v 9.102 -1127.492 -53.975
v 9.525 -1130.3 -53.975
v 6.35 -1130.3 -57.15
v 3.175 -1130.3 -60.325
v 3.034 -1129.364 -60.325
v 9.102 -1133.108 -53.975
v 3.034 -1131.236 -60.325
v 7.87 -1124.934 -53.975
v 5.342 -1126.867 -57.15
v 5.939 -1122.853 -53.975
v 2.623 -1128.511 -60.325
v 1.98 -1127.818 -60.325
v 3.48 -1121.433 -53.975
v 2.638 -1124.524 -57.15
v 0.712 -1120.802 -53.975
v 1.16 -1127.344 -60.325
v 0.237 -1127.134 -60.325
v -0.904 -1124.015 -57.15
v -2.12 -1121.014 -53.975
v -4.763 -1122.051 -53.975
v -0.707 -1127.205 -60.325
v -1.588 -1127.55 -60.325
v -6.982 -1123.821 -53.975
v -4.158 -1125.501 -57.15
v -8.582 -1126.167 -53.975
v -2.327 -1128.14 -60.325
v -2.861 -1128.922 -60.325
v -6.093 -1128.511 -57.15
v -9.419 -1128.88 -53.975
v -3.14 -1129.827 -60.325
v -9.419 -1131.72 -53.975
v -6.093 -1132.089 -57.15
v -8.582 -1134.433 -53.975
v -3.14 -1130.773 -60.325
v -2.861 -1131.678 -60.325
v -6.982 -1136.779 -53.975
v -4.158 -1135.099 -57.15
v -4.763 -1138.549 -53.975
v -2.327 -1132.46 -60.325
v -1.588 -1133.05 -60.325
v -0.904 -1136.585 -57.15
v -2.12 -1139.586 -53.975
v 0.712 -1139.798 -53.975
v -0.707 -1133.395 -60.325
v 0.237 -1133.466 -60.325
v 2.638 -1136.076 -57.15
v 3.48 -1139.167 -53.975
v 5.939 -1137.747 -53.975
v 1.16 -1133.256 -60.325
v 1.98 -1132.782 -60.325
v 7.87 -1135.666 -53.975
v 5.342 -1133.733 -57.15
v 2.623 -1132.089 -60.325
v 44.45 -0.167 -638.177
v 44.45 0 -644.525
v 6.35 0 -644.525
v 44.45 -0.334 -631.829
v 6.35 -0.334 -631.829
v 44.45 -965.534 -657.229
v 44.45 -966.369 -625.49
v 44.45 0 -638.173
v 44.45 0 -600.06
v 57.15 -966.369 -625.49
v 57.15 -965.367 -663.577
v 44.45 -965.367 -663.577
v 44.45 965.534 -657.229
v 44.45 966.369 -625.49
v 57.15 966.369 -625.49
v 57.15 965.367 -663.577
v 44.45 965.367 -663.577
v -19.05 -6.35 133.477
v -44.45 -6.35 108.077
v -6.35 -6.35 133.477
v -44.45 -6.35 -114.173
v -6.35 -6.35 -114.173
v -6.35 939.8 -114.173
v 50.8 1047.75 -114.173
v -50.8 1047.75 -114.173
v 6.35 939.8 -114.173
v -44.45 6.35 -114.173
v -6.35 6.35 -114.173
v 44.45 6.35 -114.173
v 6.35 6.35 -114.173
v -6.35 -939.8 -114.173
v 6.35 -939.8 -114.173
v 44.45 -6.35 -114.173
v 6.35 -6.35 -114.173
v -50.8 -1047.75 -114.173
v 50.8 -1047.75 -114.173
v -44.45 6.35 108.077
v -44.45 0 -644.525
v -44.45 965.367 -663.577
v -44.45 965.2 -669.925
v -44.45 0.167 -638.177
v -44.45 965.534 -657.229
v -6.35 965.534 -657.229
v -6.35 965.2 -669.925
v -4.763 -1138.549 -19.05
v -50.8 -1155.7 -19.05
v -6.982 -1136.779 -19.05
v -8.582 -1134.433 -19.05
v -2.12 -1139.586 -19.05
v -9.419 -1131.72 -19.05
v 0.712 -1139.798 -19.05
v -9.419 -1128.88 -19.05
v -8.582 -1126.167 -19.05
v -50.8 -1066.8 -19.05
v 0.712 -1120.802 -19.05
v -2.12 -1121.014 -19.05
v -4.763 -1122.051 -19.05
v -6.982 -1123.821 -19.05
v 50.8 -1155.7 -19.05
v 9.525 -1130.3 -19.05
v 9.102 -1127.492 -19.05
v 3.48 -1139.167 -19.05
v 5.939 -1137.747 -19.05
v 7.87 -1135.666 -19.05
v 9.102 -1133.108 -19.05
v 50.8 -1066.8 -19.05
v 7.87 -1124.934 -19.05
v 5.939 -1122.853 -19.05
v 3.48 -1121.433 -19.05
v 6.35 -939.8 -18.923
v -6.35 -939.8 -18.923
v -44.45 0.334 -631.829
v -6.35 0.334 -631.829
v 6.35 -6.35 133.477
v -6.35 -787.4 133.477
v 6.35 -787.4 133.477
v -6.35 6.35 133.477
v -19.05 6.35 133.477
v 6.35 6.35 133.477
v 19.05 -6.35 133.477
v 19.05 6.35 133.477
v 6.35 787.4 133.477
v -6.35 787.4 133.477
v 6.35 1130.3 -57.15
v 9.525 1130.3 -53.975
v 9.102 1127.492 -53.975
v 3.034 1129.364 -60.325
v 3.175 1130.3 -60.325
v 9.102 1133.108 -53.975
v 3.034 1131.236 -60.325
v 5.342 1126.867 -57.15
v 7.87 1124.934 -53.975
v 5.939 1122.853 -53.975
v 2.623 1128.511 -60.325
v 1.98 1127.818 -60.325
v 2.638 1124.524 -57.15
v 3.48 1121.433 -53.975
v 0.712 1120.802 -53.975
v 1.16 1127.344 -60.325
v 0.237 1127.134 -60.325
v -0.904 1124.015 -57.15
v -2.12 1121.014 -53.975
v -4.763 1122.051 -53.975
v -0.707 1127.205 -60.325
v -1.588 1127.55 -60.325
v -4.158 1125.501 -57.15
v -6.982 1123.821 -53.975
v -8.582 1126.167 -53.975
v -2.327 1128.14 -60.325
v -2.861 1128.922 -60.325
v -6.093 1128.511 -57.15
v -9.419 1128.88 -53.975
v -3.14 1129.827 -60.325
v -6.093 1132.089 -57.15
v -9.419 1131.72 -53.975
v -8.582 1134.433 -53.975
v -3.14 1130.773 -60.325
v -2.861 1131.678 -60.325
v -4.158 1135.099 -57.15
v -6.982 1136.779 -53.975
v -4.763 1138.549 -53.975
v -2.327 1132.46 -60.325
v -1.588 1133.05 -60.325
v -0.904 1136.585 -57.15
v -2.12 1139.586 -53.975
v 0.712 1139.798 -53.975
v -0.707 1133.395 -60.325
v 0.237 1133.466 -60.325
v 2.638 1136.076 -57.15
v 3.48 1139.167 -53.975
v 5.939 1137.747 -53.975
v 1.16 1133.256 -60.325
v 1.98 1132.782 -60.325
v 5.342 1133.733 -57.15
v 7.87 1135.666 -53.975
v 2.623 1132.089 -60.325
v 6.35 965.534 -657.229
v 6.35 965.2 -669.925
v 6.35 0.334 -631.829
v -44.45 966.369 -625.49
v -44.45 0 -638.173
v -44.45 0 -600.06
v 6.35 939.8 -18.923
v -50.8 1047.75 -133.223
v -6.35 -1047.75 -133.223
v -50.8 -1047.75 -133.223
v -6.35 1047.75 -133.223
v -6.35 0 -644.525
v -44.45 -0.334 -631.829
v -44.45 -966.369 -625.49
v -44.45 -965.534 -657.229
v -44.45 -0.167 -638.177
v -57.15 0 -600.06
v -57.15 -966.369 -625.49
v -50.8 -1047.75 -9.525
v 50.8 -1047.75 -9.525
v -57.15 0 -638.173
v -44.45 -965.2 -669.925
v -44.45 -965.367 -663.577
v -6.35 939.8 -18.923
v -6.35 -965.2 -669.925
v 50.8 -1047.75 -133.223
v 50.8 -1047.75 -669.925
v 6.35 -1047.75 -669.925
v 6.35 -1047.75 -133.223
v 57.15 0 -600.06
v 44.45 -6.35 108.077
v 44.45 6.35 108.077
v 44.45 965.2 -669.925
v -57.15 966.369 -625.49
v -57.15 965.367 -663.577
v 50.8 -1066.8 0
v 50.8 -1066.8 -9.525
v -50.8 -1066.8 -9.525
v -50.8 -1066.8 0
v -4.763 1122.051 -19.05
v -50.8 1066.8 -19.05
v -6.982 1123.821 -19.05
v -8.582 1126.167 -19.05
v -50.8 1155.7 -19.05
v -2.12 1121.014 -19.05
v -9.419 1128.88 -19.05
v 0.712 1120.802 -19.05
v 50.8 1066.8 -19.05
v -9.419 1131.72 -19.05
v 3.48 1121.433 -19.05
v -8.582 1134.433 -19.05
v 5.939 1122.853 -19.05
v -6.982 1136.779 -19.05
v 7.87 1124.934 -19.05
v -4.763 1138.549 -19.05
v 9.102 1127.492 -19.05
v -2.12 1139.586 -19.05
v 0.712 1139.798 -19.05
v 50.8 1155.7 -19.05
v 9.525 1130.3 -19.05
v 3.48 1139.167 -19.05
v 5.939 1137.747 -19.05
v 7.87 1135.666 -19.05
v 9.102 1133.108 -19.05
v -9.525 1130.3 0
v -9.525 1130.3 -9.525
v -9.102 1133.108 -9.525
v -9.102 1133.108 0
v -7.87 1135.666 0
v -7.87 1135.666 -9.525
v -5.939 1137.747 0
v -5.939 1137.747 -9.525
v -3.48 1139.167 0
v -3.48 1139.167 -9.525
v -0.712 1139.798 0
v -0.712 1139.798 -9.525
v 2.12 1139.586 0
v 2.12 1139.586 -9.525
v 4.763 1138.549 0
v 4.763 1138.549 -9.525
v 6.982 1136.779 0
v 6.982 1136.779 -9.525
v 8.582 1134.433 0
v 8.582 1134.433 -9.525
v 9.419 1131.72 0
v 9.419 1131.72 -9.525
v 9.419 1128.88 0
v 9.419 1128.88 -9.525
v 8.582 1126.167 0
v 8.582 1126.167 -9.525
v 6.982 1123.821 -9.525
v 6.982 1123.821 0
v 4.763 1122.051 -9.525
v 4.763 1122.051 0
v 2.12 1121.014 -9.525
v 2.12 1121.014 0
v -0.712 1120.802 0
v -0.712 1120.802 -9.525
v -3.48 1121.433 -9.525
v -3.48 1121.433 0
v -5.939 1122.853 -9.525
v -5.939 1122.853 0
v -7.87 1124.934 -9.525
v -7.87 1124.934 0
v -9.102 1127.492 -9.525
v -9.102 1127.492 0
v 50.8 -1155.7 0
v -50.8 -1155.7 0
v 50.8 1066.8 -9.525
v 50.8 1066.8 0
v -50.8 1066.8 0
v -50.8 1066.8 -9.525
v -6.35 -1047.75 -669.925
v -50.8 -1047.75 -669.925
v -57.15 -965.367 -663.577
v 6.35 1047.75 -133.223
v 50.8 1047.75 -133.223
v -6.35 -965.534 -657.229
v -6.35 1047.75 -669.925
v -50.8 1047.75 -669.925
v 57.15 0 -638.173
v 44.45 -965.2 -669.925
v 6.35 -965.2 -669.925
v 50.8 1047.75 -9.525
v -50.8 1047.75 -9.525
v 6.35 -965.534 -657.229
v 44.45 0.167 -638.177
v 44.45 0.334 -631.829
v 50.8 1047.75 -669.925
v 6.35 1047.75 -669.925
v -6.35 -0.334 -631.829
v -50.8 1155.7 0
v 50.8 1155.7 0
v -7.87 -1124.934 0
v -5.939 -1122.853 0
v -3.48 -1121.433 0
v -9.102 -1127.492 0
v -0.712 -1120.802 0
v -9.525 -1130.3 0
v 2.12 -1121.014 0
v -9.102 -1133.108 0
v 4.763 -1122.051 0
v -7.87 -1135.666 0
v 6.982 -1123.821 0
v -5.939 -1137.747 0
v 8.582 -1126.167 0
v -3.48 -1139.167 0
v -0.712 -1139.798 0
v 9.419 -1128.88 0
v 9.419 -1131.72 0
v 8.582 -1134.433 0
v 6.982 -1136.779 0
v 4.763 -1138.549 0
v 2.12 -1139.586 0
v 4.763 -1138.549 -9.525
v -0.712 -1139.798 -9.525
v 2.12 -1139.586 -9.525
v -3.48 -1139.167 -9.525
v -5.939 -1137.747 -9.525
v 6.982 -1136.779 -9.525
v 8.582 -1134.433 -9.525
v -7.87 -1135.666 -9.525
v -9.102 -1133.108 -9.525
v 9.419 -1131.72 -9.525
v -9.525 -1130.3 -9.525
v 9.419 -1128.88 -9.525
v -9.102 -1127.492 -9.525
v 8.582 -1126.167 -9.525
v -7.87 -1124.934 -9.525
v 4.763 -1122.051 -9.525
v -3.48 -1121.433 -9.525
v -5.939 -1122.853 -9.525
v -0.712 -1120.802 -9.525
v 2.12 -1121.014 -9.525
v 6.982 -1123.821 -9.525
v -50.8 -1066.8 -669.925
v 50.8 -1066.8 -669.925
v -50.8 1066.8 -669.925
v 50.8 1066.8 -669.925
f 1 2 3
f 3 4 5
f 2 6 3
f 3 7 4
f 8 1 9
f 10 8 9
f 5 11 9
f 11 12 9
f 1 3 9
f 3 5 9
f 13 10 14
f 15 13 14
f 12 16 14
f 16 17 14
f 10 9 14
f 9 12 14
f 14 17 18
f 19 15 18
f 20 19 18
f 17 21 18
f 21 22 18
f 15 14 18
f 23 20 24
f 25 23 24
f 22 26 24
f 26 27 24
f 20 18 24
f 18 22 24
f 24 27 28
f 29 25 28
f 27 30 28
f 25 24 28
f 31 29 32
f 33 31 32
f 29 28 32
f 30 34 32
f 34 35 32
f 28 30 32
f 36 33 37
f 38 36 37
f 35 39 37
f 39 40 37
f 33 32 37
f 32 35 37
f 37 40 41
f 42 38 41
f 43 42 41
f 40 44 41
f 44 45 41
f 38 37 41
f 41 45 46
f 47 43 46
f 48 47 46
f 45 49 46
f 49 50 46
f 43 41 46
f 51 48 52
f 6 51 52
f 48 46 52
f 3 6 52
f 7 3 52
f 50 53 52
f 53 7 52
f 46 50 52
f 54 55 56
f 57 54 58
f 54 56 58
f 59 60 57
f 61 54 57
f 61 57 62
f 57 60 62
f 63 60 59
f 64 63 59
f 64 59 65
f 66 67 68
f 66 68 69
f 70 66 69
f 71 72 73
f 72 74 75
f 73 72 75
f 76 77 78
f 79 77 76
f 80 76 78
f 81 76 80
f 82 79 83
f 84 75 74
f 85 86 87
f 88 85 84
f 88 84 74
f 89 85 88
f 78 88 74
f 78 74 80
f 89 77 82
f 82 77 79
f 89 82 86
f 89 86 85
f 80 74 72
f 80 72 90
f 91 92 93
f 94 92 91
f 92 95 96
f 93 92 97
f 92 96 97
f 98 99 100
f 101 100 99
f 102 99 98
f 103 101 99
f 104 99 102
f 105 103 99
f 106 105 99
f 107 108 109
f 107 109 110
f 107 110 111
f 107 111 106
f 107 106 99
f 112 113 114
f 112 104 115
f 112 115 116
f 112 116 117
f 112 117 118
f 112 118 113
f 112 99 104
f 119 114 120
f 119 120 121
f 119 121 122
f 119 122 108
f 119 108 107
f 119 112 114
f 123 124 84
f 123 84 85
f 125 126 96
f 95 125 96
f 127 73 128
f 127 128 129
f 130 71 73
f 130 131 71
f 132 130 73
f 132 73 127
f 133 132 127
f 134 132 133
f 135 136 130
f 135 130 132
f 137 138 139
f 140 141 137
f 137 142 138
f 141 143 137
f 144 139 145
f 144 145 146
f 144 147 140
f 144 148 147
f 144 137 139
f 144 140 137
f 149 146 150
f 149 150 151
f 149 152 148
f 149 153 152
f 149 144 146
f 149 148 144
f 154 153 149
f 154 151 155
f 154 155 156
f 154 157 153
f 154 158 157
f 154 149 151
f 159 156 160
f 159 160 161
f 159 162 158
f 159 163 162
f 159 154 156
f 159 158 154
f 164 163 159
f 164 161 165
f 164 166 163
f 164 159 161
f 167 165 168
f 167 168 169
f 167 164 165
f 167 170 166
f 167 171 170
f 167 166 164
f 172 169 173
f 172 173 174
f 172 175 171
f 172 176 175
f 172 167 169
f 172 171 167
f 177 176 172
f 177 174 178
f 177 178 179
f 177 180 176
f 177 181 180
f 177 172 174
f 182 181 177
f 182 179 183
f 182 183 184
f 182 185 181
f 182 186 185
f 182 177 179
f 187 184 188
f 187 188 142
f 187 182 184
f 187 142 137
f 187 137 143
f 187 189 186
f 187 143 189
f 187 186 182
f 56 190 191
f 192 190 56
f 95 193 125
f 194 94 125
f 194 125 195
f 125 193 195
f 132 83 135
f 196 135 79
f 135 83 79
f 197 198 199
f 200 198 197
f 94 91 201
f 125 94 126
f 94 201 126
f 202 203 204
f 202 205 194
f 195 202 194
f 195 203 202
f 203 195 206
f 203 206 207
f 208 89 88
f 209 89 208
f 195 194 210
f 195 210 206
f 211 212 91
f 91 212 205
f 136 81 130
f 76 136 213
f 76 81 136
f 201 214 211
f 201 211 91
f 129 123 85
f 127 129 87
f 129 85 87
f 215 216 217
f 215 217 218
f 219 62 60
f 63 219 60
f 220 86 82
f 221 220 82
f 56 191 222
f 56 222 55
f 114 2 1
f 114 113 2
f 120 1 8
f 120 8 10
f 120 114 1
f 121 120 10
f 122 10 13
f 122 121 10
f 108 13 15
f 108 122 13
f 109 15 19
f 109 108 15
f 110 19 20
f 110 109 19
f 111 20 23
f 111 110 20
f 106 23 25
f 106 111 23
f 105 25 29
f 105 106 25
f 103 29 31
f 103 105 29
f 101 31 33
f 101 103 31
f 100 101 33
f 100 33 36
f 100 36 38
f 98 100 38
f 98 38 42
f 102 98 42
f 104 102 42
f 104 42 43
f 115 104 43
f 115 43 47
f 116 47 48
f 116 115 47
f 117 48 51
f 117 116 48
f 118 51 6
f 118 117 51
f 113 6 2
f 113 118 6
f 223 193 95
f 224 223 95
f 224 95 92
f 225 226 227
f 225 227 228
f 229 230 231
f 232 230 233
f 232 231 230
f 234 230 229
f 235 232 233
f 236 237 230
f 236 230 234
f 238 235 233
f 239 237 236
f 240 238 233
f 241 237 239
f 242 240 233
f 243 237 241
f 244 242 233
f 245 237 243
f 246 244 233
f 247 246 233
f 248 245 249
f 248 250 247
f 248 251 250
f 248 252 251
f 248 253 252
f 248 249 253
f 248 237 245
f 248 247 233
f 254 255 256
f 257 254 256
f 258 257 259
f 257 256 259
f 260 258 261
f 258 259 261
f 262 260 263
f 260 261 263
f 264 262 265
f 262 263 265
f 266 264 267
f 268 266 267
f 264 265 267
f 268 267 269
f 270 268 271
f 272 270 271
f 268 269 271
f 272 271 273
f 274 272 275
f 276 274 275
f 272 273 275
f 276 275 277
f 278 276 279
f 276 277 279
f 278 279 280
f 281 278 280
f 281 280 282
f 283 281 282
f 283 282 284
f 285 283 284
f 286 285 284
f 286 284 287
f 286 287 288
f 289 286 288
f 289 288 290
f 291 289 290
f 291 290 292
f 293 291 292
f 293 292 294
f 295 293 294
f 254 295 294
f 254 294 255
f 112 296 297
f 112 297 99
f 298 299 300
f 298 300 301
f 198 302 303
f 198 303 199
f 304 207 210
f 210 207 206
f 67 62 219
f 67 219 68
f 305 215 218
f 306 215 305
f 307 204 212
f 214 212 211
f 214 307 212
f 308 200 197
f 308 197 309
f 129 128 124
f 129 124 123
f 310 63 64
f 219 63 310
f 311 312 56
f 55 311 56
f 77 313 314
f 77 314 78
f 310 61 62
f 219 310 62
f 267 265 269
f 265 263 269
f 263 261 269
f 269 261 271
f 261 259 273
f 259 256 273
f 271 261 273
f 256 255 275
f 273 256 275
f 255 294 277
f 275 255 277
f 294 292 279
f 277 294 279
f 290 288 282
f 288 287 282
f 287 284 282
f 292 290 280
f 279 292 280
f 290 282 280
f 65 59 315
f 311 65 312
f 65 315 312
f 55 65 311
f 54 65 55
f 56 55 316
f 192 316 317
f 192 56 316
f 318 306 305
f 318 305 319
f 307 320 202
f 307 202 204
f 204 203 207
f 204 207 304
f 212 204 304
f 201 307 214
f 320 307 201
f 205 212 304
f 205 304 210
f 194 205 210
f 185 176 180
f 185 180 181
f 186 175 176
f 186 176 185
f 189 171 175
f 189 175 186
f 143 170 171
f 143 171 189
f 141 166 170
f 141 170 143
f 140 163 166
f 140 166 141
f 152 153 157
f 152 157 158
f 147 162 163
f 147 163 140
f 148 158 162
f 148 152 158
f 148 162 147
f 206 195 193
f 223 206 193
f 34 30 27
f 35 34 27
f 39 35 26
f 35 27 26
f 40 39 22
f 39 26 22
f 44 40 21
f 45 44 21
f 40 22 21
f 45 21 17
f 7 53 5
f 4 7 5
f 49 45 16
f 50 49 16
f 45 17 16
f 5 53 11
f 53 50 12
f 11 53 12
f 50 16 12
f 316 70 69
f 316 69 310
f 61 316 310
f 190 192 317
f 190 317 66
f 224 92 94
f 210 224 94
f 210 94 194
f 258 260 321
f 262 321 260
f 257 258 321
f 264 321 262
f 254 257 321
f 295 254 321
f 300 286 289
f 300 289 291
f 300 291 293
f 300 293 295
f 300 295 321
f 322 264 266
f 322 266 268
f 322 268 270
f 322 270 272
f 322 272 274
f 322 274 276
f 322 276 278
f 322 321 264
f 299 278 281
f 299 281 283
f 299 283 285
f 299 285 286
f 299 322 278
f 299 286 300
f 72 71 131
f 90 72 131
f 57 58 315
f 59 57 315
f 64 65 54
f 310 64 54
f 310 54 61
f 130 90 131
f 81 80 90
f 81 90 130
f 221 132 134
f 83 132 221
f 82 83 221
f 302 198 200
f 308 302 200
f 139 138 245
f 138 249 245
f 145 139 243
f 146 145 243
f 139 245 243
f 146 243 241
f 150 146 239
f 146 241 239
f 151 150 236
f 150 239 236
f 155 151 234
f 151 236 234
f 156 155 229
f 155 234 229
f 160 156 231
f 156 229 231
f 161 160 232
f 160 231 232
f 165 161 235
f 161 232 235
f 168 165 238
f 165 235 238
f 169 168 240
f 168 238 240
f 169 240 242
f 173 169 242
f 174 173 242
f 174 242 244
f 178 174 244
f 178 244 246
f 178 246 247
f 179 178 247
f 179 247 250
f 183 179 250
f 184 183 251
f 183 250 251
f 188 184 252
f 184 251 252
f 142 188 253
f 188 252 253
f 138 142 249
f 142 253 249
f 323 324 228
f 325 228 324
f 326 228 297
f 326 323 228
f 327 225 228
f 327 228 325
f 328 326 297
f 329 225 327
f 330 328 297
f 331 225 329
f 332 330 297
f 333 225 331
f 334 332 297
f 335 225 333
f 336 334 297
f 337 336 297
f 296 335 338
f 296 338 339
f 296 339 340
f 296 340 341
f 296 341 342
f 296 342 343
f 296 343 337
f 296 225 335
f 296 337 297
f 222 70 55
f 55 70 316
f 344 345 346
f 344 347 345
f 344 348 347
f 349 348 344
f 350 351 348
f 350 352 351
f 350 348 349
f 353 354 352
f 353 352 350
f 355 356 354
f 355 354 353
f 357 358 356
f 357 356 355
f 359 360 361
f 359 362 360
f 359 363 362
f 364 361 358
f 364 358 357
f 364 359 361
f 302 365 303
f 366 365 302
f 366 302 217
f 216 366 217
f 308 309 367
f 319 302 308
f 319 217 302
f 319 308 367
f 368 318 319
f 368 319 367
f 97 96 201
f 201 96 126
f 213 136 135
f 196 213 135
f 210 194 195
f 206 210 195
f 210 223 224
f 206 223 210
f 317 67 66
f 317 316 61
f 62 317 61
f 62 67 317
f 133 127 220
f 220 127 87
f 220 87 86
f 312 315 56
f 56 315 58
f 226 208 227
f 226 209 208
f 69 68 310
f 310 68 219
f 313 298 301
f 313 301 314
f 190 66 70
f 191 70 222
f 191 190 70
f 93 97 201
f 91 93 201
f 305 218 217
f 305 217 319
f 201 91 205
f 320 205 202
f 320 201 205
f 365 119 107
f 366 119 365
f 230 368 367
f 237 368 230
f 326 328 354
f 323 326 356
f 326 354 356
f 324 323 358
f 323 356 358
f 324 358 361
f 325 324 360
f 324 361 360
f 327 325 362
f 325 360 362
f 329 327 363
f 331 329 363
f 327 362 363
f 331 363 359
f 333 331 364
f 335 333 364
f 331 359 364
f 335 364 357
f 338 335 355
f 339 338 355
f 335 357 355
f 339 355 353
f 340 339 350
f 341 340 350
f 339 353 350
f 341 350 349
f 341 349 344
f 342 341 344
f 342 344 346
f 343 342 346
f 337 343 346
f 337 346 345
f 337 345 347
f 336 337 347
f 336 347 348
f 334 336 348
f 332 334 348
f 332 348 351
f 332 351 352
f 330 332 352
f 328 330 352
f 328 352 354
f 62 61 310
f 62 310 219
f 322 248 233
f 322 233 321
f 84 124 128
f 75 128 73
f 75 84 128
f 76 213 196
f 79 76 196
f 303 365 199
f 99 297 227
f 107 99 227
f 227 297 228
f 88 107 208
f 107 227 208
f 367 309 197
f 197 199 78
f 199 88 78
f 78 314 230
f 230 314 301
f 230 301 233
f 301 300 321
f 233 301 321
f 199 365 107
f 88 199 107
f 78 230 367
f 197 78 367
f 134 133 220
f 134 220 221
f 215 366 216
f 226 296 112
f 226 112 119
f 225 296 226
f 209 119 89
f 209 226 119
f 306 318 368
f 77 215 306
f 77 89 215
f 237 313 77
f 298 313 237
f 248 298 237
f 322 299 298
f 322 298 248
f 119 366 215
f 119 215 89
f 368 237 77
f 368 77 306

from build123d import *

# Parameters (mm, degrees)
F0_W      = 1047.75
F0_H      = 19.05
F1_DEPTH  = 50.8
F2_W      = 2095.5
F2_H      = 536.702
F3_DEPTH  = 6.35
F4_W      = 12.7
F4_H      = 1879.6
F5_DEPTH  = 247.65
F6_SIZE   = 152.4
F7_W      = 88.9
F7_H      = 12.7
F8_DEPTH  = 247.65
F9_SIZE   = 25.4
F11_D     = 19.05
F13_R     = 9.525
F14_DEPTH = 50.8
F15_SIZE  = 6.35
F18_DEPTH = 38.1
F20_DEPTH = 12.7


with BuildPart() as f1:
    # F0 (on Right) → F1 (new body, symmetric)
    with BuildSketch(Plane.YZ):
        Polygon((-1047.75, -9.525), (-1066.8, -9.525), (-1066.8, -19.05), (-1066.8, -669.925), (-1047.75, -669.925), (-1047.75, -133.223), (-1047.75, -114.173), align=None)
        Polygon((-1066.8, 0), (-1155.7, 0), (-1155.7, -19.05), (-1066.8, -19.05), (-1066.8, -9.525), align=None)
        with Locations((-523.875, -123.698)):
            Rectangle(F0_W, F0_H)
        with Locations((523.875, -123.698)):
            Rectangle(F0_W, F0_H)
        Polygon((1047.75, -9.525), (1047.75, -114.173), (1047.75, -133.223), (1047.75, -669.925), (1066.8, -669.925), (1066.8, -19.05), (1066.8, -9.525), align=None)
        Polygon((1066.8, 0), (1066.8, -9.525), (1066.8, -19.05), (1155.7, -19.05), (1155.7, 0), align=None)
    extrude(amount=F1_DEPTH, both=True)

    # F2 (on Right) → F3 (join, symmetric)
    with BuildSketch(Plane.YZ):
        with Locations((0, -401.574)):
            Rectangle(F2_W, F2_H)
    extrude(amount=F3_DEPTH, both=True)

    # F4 (on face) → F5 (join)
    with BuildSketch(Plane.XY.offset(-114.173)):
        Rectangle(F4_W, F4_H)
    extrude(amount=F5_DEPTH)

    # F6
    f6_edges = [f1.edges().sort_by_distance(p)[0] for p in [
        (0, -939.8, 133.477),
        (0, 939.8, 133.477),
    ]]
    chamfer(f6_edges, length=F6_SIZE)

    # F7 (on face) → F8 (join)
    with BuildSketch(Plane.XY.offset(-114.173)):
        Rectangle(F7_W, F7_H)
    extrude(amount=F8_DEPTH)

    # F9
    f9_edges = [f1.edges().sort_by_distance(p)[0] for p in [
        (44.45, 0, 133.477),
        (-44.45, 0, 133.477),
    ]]
    chamfer(f9_edges, length=F9_SIZE)

    # F11 (through all)
    with Locations(Plane.XY):
        with Locations((0, -1130.3), (0, 1130.3)):
            Hole(F11_D / 2)

    # F13 (on offset) → F14 (join)
    with BuildSketch(Plane.XY.offset(-9.525)):
        with Locations((0, -1130.3)):
            Circle(F13_R)
    extrude(amount=-F14_DEPTH)

    # F15
    f15_edges = [f1.edges().sort_by_distance(p)[0] for p in [
        (-9.525, -1130.3, -60.325),
    ]]
    chamfer(f15_edges, length=F15_SIZE)

    # F16: F1 across plane


with BuildPart() as f1_1:
    add(f1.part)
    add(f1.part.mirror(Plane.XZ))


with BuildPart() as f18:
    # F17 (on face) → F18 (new body)
    with BuildSketch(Plane.YZ.offset(6.35)):
        Polygon((-965.5340948625, -657.2293952242), (-965.2, -669.925), (0, -644.525), (-0.3340948625, -631.8293952242), align=None)
    extrude(amount=F18_DEPTH)

    # F19 (on face) → F20 (join)
    with BuildSketch(Plane.YZ.offset(44.45)):
        Polygon((-966.3693320188, -625.4903832848), (-965.3670474312, -663.5771976121), (0, -638.1728016271), (0, -600.0596113895), align=None)
    extrude(amount=F20_DEPTH)


with BuildPart() as f21_1:
    # F21: instance of F18
    add(f18.part.mirror(Plane.XZ))


with BuildPart() as f22_1:
    # F22: instance of F18
    add(f18.part.mirror(Plane.YZ))


with BuildPart() as f23_1:
    # F23: instance of F22_1
    add(f22_1.part.mirror(Plane.XZ))


solid = Compound([f1_1.part, f18.part, f21_1.part, f22_1.part, f23_1.part])
